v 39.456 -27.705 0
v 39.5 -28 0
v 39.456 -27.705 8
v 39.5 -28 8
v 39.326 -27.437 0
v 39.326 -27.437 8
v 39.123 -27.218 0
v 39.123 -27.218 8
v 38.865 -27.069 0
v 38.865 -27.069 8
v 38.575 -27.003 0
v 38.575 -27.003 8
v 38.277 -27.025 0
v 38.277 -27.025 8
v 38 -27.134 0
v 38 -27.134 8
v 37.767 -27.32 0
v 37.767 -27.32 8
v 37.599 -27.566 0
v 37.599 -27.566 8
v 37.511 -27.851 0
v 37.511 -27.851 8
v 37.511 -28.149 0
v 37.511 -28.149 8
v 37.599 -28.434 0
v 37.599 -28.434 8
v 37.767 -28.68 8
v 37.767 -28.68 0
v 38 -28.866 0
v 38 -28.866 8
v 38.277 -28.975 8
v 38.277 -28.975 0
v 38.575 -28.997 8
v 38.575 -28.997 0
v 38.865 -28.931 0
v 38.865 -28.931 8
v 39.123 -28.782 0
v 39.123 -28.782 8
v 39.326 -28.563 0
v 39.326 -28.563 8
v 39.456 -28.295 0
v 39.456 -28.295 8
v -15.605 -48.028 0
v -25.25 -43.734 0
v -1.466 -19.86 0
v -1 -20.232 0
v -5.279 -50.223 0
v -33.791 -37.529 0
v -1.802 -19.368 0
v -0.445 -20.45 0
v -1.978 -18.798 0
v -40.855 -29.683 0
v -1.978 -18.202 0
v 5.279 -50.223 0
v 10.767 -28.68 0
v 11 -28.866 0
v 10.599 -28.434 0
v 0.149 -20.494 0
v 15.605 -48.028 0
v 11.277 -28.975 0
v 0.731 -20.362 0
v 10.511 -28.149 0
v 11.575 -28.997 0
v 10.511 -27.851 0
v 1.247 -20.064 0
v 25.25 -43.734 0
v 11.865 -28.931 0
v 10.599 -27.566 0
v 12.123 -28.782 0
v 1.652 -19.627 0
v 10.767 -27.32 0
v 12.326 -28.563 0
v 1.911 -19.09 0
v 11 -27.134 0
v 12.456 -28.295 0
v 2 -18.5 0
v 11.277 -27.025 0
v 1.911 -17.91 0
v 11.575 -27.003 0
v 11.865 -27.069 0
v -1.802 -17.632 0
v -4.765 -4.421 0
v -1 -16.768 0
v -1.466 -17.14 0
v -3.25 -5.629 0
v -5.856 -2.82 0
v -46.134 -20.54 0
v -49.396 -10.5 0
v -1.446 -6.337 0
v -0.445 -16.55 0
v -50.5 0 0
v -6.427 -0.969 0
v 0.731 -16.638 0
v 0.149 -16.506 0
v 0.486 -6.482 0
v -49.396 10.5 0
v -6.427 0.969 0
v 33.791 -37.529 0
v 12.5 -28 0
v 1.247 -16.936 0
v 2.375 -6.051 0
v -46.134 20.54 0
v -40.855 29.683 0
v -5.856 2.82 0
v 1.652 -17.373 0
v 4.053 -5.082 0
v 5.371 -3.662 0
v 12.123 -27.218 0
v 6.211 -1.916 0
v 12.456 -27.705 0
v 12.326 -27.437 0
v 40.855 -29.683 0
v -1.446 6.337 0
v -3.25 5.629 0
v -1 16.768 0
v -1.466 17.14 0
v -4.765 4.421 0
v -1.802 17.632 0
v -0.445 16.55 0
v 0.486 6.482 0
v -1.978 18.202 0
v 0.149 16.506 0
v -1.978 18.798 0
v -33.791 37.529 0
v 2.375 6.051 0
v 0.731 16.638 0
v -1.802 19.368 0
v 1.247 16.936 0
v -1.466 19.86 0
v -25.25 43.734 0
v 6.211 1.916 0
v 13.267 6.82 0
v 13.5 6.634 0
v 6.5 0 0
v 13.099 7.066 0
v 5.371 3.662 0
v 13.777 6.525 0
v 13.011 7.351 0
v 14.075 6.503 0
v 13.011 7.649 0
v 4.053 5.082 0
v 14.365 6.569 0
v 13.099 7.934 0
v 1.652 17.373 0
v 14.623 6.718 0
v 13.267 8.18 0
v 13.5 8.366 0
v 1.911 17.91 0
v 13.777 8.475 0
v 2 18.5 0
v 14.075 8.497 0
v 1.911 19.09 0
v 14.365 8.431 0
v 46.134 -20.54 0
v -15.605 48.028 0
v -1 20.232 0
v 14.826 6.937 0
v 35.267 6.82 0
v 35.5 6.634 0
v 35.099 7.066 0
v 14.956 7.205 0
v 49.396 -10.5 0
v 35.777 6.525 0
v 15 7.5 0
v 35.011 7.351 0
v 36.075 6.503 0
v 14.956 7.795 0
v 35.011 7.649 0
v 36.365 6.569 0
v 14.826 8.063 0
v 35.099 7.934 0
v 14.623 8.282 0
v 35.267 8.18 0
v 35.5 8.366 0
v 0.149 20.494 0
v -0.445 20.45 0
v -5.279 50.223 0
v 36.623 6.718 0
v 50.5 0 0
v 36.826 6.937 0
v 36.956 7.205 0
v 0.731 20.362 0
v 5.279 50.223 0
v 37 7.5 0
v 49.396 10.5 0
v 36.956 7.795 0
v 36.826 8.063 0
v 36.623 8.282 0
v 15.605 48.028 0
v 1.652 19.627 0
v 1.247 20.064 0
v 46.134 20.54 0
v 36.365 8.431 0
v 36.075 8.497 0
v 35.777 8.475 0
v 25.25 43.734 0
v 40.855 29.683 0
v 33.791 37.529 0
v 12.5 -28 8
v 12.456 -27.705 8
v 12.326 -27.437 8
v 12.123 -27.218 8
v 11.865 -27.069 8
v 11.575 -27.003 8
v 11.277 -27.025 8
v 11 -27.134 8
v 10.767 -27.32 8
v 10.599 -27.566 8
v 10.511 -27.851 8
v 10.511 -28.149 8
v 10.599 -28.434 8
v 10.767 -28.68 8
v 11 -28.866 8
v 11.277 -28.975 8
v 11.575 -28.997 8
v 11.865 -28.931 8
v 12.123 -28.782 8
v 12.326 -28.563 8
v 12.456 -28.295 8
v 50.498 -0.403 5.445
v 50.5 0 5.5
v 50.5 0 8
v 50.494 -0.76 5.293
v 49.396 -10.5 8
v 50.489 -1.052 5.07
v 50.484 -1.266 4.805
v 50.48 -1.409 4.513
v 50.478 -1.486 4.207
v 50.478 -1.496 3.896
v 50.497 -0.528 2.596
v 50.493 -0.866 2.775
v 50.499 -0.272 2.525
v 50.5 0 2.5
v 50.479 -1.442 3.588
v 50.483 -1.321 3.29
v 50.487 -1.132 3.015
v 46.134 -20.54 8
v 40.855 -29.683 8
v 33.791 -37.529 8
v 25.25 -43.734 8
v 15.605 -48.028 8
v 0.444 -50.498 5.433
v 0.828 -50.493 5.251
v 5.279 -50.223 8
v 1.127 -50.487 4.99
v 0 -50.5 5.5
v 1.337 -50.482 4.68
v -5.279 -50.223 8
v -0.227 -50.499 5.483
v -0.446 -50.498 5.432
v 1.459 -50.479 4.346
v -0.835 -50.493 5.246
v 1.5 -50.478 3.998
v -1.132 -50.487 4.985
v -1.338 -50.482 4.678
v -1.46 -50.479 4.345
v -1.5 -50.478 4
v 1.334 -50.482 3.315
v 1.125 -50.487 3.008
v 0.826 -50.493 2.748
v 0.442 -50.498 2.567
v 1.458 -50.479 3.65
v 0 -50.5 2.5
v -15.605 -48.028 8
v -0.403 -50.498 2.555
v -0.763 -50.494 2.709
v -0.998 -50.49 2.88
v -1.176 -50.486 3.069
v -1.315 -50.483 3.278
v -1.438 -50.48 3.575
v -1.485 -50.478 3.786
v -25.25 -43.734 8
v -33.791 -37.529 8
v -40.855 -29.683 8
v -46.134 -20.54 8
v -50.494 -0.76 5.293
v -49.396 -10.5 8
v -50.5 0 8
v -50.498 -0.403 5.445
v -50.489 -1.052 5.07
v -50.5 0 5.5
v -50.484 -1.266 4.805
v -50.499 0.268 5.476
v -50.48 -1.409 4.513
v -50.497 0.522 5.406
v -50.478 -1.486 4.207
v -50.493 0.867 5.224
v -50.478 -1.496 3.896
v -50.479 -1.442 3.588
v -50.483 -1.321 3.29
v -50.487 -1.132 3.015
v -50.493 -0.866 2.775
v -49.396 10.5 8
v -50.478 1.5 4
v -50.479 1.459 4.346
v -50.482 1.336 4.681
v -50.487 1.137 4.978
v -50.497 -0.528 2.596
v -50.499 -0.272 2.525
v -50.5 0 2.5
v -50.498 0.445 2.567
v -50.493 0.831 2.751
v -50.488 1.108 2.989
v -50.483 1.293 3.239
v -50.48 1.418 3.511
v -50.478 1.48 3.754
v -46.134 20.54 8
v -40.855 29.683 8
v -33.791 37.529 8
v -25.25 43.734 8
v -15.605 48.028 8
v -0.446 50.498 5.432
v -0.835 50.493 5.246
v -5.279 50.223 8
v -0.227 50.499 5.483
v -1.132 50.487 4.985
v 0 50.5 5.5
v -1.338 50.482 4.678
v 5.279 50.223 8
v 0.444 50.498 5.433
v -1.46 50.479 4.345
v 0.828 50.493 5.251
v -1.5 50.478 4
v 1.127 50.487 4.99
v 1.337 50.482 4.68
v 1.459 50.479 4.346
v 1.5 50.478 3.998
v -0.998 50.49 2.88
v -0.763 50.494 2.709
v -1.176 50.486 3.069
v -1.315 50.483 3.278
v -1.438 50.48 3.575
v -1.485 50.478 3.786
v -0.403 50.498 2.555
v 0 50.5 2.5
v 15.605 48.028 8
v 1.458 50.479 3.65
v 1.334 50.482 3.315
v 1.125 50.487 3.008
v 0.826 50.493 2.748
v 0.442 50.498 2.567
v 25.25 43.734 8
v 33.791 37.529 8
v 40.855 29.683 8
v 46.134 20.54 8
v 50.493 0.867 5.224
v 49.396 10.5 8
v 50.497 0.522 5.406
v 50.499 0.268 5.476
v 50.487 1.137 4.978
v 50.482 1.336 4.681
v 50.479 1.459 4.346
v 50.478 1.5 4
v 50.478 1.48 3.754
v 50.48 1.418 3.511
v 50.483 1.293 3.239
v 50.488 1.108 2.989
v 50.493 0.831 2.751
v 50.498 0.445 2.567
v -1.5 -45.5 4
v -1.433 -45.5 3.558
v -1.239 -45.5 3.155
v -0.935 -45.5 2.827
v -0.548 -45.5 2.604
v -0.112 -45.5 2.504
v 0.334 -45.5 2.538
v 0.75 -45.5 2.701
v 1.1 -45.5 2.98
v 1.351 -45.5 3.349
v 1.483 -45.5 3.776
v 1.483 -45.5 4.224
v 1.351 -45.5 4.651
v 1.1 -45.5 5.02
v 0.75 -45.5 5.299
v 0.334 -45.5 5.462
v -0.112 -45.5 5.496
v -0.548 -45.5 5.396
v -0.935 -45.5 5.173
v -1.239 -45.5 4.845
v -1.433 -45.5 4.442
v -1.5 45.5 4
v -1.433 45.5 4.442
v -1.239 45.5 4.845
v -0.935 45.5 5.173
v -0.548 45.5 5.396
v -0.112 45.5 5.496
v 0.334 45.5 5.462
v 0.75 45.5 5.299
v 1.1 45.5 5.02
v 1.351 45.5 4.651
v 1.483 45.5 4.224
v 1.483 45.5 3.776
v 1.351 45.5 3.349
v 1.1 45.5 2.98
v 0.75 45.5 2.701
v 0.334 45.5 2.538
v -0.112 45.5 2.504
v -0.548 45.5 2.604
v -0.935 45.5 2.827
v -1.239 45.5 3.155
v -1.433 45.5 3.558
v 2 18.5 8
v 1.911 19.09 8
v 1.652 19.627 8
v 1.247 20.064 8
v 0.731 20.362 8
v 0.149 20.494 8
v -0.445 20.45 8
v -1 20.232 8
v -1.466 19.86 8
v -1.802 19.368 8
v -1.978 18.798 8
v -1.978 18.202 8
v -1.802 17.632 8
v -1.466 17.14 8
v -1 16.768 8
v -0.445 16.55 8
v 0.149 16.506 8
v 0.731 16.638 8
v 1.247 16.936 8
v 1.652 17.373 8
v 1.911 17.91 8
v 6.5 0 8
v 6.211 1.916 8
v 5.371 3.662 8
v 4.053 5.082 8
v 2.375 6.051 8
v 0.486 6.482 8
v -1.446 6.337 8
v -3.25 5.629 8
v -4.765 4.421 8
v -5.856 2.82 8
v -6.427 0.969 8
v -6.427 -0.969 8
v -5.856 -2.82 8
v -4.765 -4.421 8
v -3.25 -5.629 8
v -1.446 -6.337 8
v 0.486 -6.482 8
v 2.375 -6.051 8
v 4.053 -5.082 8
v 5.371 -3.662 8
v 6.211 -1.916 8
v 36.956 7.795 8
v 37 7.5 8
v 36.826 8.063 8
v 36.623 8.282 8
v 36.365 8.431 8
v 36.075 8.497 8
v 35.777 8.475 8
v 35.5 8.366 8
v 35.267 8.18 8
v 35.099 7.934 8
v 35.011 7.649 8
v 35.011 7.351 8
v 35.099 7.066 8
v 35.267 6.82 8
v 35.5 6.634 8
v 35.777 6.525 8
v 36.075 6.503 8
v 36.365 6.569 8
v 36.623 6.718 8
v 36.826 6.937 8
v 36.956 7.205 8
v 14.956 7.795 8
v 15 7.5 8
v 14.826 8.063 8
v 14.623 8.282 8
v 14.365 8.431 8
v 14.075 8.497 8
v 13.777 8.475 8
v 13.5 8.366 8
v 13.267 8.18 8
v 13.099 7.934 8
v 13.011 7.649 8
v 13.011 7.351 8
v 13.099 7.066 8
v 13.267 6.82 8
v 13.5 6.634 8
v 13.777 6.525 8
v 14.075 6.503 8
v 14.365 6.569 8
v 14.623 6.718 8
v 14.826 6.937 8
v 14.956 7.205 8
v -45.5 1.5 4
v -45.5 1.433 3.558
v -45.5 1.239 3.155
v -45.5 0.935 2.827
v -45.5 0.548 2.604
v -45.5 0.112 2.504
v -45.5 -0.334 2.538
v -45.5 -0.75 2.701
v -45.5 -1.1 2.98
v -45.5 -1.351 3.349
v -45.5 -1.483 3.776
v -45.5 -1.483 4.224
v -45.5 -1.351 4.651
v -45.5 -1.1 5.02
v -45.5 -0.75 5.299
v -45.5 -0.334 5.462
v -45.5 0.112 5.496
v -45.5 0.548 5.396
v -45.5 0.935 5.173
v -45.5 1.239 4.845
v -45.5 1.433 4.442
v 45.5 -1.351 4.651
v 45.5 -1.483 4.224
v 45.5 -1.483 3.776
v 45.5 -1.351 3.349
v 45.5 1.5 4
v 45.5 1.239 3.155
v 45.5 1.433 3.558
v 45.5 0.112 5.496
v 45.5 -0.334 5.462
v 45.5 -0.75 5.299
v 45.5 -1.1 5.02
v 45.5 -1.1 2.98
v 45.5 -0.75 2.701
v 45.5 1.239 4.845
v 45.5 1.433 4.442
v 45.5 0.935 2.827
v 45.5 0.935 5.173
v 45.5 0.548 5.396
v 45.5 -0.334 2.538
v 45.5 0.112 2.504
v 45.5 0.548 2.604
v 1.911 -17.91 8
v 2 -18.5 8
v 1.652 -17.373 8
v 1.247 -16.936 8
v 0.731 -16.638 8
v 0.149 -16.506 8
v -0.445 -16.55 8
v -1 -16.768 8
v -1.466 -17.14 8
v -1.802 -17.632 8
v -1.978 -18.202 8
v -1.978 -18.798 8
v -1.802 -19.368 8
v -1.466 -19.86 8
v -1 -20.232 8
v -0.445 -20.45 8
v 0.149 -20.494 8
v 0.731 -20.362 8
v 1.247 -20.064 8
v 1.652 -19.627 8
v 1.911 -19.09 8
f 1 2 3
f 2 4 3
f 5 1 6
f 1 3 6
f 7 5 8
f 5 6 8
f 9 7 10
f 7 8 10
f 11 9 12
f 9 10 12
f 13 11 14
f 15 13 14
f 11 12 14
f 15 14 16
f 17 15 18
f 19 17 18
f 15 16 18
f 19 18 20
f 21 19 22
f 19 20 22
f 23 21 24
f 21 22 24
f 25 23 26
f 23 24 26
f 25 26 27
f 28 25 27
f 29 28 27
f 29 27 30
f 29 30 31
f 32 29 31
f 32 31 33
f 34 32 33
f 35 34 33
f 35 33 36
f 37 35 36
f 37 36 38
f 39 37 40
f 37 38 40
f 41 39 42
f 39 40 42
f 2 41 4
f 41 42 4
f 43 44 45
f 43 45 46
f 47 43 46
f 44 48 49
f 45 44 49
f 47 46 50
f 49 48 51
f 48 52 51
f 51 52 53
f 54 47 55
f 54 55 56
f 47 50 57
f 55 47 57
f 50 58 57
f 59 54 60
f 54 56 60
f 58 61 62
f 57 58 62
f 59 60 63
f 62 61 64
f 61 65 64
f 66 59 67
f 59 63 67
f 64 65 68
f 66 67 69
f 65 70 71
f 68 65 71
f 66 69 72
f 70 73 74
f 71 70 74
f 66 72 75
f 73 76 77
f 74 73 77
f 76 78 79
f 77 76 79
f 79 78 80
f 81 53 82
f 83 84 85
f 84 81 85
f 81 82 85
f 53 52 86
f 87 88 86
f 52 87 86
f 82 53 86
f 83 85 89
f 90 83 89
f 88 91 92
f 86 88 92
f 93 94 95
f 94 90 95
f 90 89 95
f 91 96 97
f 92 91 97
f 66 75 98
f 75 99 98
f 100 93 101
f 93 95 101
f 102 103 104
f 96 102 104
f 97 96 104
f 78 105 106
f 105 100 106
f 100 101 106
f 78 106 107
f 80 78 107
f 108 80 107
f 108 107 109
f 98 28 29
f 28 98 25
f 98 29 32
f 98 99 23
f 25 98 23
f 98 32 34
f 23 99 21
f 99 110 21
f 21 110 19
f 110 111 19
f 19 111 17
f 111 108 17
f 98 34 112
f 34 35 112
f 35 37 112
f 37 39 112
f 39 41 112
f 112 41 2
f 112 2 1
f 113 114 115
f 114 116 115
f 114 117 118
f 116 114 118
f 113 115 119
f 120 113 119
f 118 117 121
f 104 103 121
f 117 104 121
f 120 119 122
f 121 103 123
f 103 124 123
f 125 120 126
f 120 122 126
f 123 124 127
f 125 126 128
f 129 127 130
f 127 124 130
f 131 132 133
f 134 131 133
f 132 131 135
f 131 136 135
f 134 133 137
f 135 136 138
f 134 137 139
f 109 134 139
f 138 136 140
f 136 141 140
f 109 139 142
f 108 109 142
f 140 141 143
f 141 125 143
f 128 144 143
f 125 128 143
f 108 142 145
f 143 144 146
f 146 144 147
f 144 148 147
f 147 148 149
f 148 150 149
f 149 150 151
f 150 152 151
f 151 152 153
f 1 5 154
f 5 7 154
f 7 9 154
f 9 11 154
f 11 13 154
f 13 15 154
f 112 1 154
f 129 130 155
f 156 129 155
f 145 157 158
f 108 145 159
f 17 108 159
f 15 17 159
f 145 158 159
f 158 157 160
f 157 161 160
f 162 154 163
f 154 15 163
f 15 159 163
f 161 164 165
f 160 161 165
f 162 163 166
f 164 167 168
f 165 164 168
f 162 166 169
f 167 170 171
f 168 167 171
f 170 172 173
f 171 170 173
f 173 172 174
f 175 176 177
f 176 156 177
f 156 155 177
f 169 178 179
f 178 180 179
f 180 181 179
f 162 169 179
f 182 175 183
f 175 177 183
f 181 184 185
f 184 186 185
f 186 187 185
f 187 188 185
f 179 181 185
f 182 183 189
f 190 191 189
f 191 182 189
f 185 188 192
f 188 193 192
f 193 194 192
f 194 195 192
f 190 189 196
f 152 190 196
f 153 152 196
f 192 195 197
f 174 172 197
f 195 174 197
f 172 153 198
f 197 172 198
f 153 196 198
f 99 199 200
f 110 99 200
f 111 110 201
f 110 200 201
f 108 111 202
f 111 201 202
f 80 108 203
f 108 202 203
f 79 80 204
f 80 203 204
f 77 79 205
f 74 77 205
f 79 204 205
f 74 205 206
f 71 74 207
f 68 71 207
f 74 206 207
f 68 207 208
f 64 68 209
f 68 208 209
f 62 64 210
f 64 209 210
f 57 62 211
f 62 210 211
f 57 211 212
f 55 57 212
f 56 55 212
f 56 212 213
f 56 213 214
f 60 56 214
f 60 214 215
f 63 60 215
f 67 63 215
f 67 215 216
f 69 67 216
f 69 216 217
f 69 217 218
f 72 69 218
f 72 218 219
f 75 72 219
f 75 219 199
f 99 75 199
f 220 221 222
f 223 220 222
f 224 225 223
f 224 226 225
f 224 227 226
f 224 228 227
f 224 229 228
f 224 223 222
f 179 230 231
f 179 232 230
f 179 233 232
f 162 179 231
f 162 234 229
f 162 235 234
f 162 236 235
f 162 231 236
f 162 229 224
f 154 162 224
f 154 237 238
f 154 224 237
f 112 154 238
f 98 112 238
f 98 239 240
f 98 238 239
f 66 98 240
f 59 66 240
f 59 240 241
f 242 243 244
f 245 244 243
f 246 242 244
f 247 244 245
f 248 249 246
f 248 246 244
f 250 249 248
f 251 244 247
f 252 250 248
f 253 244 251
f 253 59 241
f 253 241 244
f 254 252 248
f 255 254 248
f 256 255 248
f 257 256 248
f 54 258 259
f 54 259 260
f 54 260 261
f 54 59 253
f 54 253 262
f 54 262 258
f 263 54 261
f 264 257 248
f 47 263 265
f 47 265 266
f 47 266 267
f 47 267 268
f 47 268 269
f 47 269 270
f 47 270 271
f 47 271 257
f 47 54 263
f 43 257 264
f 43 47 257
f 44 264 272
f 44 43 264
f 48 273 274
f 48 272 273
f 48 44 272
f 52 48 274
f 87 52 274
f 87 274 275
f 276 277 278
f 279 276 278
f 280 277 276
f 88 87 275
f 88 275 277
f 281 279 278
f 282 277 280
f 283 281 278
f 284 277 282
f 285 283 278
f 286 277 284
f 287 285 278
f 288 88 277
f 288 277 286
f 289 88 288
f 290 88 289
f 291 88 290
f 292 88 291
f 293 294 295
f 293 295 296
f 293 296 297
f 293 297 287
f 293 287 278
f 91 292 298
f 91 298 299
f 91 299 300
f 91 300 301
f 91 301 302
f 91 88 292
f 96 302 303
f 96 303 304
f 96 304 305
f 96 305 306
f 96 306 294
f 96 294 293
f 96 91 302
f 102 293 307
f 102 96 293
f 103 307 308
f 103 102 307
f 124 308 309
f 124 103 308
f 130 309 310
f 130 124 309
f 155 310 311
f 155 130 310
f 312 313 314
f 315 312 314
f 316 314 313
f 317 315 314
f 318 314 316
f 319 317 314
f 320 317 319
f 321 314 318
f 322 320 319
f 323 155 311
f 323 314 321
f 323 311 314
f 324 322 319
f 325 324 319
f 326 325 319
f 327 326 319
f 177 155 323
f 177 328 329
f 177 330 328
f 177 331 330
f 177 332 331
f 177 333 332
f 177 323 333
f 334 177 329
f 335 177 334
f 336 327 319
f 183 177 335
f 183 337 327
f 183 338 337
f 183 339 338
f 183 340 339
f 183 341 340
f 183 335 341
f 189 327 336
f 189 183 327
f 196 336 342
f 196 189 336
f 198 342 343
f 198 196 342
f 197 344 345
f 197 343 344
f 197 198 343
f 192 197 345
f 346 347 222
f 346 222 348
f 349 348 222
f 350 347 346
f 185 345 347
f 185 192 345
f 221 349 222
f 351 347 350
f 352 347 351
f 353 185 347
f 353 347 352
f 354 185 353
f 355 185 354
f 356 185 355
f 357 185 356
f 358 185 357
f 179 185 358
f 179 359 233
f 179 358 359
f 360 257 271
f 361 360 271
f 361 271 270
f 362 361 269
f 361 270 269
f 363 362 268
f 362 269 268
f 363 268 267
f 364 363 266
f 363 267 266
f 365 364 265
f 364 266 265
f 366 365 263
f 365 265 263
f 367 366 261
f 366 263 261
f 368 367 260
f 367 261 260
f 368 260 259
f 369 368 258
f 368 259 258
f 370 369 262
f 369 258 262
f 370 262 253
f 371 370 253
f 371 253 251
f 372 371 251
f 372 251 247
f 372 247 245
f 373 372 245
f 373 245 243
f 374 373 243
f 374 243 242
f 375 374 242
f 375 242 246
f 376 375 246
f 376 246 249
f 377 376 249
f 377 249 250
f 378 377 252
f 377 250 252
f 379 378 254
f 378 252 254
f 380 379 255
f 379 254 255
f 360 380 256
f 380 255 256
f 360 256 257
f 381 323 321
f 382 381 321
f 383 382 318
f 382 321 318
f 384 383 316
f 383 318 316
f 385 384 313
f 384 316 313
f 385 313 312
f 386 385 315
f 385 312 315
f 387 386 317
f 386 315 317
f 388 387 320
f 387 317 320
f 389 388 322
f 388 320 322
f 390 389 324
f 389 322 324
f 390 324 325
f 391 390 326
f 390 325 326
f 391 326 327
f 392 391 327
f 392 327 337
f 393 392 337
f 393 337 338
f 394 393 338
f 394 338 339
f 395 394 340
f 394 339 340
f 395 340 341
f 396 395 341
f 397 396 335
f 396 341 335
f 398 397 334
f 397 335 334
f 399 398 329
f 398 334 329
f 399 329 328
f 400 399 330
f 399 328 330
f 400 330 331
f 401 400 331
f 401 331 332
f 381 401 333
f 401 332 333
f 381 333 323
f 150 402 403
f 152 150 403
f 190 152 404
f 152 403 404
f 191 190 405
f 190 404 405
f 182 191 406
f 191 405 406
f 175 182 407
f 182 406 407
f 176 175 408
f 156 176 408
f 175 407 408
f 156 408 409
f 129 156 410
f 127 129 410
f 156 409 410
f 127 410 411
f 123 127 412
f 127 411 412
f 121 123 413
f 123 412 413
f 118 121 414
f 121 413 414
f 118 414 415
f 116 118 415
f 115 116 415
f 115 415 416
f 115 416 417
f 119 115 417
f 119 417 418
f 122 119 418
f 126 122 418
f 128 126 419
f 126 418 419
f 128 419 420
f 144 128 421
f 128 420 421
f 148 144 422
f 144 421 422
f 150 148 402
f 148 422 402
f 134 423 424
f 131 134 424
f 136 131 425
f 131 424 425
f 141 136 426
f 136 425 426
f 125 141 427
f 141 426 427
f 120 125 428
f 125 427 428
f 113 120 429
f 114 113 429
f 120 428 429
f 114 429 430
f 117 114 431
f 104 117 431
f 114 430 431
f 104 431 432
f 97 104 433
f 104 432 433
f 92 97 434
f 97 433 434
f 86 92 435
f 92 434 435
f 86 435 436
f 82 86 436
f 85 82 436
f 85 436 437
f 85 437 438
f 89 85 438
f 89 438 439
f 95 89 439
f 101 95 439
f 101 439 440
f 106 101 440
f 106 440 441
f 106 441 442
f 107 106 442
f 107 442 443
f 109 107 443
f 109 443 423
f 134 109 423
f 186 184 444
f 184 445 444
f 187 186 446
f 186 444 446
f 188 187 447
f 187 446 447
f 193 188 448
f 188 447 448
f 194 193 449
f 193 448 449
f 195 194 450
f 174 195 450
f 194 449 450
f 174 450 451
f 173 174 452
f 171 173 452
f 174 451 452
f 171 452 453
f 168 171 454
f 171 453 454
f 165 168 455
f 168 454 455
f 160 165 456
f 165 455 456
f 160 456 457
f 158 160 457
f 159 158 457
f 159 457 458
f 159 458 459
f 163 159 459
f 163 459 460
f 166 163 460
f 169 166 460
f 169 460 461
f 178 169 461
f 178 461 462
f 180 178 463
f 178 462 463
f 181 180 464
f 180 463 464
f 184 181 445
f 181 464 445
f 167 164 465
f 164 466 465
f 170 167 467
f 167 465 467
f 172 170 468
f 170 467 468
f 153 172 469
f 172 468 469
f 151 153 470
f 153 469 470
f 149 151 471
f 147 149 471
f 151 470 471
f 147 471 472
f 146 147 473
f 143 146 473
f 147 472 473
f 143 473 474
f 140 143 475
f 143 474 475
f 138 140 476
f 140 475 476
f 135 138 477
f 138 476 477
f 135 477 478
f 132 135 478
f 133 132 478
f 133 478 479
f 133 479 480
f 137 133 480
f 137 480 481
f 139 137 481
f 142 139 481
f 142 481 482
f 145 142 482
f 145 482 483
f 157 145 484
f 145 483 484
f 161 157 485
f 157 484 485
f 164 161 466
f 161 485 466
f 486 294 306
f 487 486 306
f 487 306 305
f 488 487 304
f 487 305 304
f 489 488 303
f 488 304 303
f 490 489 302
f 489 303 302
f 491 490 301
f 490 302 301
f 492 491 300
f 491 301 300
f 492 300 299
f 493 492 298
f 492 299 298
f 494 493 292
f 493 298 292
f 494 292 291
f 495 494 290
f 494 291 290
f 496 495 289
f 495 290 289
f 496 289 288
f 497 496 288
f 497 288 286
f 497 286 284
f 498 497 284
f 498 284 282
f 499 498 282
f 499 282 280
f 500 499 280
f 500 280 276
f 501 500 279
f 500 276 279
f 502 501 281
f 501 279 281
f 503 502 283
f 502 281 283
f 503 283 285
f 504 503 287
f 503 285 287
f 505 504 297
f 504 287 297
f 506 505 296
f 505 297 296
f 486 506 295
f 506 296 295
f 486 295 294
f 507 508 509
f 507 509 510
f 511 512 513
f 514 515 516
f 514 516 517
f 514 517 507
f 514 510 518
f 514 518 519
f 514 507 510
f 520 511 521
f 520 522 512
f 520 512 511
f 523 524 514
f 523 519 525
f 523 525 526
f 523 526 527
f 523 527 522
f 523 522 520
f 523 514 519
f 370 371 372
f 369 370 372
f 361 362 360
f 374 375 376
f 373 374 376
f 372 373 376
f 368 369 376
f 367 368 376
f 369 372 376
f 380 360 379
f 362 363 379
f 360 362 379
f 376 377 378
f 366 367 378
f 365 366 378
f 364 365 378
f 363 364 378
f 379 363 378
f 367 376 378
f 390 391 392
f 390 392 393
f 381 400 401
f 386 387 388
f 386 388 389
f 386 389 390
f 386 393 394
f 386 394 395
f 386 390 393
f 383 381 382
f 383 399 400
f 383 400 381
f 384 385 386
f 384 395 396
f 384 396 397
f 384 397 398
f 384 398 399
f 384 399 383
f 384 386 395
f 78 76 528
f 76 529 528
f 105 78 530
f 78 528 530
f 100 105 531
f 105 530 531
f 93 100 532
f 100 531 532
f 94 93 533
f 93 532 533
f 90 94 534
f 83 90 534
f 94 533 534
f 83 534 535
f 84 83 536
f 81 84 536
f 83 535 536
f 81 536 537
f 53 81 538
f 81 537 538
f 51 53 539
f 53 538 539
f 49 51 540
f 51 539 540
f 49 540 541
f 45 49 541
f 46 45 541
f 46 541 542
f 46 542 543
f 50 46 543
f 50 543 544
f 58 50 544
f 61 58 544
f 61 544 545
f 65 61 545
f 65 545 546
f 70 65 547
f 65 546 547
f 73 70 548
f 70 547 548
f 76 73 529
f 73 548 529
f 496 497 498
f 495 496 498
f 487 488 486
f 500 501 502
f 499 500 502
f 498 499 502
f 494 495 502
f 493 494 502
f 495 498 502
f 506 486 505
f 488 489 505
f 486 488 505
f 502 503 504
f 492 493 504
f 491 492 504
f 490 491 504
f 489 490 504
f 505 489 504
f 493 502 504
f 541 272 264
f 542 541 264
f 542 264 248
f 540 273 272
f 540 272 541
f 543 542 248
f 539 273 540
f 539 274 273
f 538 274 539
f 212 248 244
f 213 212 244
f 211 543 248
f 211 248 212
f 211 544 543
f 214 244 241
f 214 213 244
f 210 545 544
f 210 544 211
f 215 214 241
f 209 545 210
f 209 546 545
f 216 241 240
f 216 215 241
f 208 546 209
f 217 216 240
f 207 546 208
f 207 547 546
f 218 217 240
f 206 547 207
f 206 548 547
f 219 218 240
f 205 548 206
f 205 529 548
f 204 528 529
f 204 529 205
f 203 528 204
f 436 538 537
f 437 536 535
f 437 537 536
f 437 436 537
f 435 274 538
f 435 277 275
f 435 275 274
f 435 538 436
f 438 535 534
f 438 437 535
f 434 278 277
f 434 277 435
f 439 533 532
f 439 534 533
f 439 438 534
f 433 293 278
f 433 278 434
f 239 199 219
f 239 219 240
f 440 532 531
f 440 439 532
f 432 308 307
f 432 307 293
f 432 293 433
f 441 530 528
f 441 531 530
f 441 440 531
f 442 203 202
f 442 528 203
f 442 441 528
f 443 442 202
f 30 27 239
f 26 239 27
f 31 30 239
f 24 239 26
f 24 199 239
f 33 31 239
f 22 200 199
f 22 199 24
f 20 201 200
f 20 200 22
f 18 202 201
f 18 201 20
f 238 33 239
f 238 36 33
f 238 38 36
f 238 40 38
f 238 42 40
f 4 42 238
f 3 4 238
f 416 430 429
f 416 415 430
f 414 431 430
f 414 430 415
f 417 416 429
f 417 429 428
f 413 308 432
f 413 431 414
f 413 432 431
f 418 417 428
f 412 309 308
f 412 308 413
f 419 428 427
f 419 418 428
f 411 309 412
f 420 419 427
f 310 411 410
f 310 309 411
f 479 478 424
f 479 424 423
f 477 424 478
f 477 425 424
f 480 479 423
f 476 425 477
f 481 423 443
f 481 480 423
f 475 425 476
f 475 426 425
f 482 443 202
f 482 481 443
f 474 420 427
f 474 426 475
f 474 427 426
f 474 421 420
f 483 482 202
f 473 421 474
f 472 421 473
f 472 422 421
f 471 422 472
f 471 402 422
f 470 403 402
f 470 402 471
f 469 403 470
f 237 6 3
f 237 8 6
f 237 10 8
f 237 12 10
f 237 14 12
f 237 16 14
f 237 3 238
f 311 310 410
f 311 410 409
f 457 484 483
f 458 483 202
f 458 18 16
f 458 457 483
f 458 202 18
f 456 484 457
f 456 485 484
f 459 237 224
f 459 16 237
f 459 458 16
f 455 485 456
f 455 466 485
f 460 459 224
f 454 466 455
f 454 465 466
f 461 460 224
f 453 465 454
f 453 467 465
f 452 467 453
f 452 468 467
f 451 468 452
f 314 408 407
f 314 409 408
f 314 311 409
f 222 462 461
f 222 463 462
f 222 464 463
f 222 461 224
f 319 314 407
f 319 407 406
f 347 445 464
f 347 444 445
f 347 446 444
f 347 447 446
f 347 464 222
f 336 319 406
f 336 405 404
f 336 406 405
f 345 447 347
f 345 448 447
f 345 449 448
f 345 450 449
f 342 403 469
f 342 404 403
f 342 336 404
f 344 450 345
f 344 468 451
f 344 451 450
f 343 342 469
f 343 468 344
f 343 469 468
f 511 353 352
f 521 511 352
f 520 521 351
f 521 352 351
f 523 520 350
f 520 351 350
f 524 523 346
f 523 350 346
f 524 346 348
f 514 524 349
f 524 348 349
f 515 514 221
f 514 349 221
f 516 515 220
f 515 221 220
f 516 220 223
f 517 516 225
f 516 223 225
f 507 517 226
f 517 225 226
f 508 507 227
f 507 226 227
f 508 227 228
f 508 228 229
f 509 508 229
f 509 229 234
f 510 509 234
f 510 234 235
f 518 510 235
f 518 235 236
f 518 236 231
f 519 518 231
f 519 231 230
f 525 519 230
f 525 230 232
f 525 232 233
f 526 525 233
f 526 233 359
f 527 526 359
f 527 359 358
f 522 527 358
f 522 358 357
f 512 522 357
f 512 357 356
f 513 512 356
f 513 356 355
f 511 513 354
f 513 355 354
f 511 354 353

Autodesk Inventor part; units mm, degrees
sketch "スケッチ1" plane through (0, 0, 0) normal (0, 0, 1) x (1, 0, 0)
  circle A0 centre (0, 0) radius 50.5
  dimension "d0" = 101
extrude "押し出し1" add sketch "スケッチ1" along normal blind 8
ref_plane "作業平面1" through (50.5, 0, 0) normal (1, 0, 0) x (0, 1, 0)
ref_plane "作業平面2" through (-50.5, 0, 0) normal (1, 0, 0) x (0, 1, 0)
ref_plane "作業平面3" through (0, 50.5, 0) normal (0, 1, 0) x (-1, 0, 0)
ref_plane "作業平面4" through (0, -50.5, 0) normal (0, 1, 0) x (-1, 0, 0)
sketch "スケッチ2" plane through (50.5, 0, 0) normal (1, 0, 0) x (0, 1, 0)
  line L0 (0, 0) -> (0, 4) construction
  circle A0 centre (0, 4) radius 1.5
  dimension "d7" = 4
  dimension "d8" = 3
extrude "押し出し2" cut sketch "スケッチ2" against normal blind 5
sketch "スケッチ3" plane through (-50.5, 0, 0) normal (1, 0, 0) x (0, 1, 0)
  line L0 (0, 0) -> (0, 4) construction
  circle A0 centre (0, 4) radius 1.5
  dimension "d11" = 4
  dimension "d12" = 3
extrude "押し出し3" cut sketch "スケッチ3" along normal blind 5
sketch "スケッチ4" plane through (0, 50.5, 0) normal (0, 1, 0) x (-1, 0, 0)
  line L0 (0, 0) -> (0, 4) construction
  circle A0 centre (0, 4) radius 1.5
  dimension "d15" = 4
  dimension "d16" = 3
extrude "押し出し4" cut sketch "スケッチ4" against normal blind 5
sketch "スケッチ5" plane through (0, -50.5, 0) normal (0, 1, 0) x (-1, 0, 0)
  line L0 (0, 0) -> (0, 4) construction
  circle A0 centre (0, 4) radius 1.5
  dimension "d19" = 4
  dimension "d20" = 3
extrude "押し出し5" cut sketch "スケッチ5" along normal blind 5
thread "ねじ1" size "M3x0.5" class "6H" standard "ANSI Metric M Profile" full length
thread "ねじ2" size "M3x0.5" class "6H" standard "ANSI Metric M Profile" full length
thread "ねじ3" size "M3x0.5" class "6H" standard "ANSI Metric M Profile" full length
thread "ねじ4" size "M3x0.5" class "6H" standard "ANSI Metric M Profile" full length
sketch "スケッチ8" plane through (0, 0, 8) normal (0, 0, 1) x (1, 0, 0)
  line L0 (0, 0) -> (0, 18.5) construction
  line L1 (0, 0) -> (0, -18.5) construction
  circle A0 centre (0, 18.5) radius 2
  circle A1 centre (0, -18.5) radius 2
  circle A2 centre (0, 0) radius 6.5
  dimension "d62" = 18.5
  dimension "d63" = 18.5
  dimension "d64" = 4
  dimension "d65" = 4
  dimension "d66" = 13
extrude "押し出し7" cut sketch "スケッチ8" against normal blind 8
thread "ねじ7" size "M4x0.7" class "6H" standard "ANSI Metric M Profile" full length
thread "ねじ8" size "M4x0.7" class "6H" standard "ANSI Metric M Profile" full length
sketch "スケッチ9" plane through (0, 0, 8) normal (0, 0, 1) x (1, 0, 0)
  line L0 (0, 0) -> (25, 0) construction
  line L1 (25, 0) -> (25, -1) construction
  line L2 (25, 0) -> (25, 7.5) construction
  circle A0 centre (36, 7.5) radius 1
  line L3 (36, 7.5) -> (14, 7.5) construction
  circle A1 centre (14, 7.5) radius 1
  line L4 (25, -1) -> (25, -10) construction
  line L5 (25, -10) -> (25, -28) construction
  circle A2 centre (11.5, -28) radius 1
  line L6 (25, 0) -> (9, 0) construction
  line L7 (9, 0) -> (9, -31) construction
  line L8 (9, -31) -> (41, -31) construction
  line L9 (41, -31) -> (41, 0) construction
  line L10 (25, 0) -> (25, 12) construction
  line L11 (14.417, 12) -> (35.583, 12) construction
  arc A3 (14.757, 12.2915) -> (9, 0) centre (25, 0) ccw construction
  arc A4 (41, 0) -> (35.583, 12) centre (25, 0) ccw construction
  line L12 (11.5, -28) -> (38.5, -28) construction
  circle A5 centre (38.5, -28) radius 1
  dimension "d92" = 25
  dimension "d103" = 7.5
  dimension "d105" = 2
  dimension "d108" = 2
  dimension "d117" = 2
  dimension "d129" = 16
  dimension "d130" = 31
  dimension "d131" = 32
  dimension "d134" = 22
  dimension "d146" = 28
  dimension "d147" = 27
  dimension "d148" = 2
extrude "押し出し11" cut sketch "スケッチ9" against normal blind 8
properties part number "outsideCover"
